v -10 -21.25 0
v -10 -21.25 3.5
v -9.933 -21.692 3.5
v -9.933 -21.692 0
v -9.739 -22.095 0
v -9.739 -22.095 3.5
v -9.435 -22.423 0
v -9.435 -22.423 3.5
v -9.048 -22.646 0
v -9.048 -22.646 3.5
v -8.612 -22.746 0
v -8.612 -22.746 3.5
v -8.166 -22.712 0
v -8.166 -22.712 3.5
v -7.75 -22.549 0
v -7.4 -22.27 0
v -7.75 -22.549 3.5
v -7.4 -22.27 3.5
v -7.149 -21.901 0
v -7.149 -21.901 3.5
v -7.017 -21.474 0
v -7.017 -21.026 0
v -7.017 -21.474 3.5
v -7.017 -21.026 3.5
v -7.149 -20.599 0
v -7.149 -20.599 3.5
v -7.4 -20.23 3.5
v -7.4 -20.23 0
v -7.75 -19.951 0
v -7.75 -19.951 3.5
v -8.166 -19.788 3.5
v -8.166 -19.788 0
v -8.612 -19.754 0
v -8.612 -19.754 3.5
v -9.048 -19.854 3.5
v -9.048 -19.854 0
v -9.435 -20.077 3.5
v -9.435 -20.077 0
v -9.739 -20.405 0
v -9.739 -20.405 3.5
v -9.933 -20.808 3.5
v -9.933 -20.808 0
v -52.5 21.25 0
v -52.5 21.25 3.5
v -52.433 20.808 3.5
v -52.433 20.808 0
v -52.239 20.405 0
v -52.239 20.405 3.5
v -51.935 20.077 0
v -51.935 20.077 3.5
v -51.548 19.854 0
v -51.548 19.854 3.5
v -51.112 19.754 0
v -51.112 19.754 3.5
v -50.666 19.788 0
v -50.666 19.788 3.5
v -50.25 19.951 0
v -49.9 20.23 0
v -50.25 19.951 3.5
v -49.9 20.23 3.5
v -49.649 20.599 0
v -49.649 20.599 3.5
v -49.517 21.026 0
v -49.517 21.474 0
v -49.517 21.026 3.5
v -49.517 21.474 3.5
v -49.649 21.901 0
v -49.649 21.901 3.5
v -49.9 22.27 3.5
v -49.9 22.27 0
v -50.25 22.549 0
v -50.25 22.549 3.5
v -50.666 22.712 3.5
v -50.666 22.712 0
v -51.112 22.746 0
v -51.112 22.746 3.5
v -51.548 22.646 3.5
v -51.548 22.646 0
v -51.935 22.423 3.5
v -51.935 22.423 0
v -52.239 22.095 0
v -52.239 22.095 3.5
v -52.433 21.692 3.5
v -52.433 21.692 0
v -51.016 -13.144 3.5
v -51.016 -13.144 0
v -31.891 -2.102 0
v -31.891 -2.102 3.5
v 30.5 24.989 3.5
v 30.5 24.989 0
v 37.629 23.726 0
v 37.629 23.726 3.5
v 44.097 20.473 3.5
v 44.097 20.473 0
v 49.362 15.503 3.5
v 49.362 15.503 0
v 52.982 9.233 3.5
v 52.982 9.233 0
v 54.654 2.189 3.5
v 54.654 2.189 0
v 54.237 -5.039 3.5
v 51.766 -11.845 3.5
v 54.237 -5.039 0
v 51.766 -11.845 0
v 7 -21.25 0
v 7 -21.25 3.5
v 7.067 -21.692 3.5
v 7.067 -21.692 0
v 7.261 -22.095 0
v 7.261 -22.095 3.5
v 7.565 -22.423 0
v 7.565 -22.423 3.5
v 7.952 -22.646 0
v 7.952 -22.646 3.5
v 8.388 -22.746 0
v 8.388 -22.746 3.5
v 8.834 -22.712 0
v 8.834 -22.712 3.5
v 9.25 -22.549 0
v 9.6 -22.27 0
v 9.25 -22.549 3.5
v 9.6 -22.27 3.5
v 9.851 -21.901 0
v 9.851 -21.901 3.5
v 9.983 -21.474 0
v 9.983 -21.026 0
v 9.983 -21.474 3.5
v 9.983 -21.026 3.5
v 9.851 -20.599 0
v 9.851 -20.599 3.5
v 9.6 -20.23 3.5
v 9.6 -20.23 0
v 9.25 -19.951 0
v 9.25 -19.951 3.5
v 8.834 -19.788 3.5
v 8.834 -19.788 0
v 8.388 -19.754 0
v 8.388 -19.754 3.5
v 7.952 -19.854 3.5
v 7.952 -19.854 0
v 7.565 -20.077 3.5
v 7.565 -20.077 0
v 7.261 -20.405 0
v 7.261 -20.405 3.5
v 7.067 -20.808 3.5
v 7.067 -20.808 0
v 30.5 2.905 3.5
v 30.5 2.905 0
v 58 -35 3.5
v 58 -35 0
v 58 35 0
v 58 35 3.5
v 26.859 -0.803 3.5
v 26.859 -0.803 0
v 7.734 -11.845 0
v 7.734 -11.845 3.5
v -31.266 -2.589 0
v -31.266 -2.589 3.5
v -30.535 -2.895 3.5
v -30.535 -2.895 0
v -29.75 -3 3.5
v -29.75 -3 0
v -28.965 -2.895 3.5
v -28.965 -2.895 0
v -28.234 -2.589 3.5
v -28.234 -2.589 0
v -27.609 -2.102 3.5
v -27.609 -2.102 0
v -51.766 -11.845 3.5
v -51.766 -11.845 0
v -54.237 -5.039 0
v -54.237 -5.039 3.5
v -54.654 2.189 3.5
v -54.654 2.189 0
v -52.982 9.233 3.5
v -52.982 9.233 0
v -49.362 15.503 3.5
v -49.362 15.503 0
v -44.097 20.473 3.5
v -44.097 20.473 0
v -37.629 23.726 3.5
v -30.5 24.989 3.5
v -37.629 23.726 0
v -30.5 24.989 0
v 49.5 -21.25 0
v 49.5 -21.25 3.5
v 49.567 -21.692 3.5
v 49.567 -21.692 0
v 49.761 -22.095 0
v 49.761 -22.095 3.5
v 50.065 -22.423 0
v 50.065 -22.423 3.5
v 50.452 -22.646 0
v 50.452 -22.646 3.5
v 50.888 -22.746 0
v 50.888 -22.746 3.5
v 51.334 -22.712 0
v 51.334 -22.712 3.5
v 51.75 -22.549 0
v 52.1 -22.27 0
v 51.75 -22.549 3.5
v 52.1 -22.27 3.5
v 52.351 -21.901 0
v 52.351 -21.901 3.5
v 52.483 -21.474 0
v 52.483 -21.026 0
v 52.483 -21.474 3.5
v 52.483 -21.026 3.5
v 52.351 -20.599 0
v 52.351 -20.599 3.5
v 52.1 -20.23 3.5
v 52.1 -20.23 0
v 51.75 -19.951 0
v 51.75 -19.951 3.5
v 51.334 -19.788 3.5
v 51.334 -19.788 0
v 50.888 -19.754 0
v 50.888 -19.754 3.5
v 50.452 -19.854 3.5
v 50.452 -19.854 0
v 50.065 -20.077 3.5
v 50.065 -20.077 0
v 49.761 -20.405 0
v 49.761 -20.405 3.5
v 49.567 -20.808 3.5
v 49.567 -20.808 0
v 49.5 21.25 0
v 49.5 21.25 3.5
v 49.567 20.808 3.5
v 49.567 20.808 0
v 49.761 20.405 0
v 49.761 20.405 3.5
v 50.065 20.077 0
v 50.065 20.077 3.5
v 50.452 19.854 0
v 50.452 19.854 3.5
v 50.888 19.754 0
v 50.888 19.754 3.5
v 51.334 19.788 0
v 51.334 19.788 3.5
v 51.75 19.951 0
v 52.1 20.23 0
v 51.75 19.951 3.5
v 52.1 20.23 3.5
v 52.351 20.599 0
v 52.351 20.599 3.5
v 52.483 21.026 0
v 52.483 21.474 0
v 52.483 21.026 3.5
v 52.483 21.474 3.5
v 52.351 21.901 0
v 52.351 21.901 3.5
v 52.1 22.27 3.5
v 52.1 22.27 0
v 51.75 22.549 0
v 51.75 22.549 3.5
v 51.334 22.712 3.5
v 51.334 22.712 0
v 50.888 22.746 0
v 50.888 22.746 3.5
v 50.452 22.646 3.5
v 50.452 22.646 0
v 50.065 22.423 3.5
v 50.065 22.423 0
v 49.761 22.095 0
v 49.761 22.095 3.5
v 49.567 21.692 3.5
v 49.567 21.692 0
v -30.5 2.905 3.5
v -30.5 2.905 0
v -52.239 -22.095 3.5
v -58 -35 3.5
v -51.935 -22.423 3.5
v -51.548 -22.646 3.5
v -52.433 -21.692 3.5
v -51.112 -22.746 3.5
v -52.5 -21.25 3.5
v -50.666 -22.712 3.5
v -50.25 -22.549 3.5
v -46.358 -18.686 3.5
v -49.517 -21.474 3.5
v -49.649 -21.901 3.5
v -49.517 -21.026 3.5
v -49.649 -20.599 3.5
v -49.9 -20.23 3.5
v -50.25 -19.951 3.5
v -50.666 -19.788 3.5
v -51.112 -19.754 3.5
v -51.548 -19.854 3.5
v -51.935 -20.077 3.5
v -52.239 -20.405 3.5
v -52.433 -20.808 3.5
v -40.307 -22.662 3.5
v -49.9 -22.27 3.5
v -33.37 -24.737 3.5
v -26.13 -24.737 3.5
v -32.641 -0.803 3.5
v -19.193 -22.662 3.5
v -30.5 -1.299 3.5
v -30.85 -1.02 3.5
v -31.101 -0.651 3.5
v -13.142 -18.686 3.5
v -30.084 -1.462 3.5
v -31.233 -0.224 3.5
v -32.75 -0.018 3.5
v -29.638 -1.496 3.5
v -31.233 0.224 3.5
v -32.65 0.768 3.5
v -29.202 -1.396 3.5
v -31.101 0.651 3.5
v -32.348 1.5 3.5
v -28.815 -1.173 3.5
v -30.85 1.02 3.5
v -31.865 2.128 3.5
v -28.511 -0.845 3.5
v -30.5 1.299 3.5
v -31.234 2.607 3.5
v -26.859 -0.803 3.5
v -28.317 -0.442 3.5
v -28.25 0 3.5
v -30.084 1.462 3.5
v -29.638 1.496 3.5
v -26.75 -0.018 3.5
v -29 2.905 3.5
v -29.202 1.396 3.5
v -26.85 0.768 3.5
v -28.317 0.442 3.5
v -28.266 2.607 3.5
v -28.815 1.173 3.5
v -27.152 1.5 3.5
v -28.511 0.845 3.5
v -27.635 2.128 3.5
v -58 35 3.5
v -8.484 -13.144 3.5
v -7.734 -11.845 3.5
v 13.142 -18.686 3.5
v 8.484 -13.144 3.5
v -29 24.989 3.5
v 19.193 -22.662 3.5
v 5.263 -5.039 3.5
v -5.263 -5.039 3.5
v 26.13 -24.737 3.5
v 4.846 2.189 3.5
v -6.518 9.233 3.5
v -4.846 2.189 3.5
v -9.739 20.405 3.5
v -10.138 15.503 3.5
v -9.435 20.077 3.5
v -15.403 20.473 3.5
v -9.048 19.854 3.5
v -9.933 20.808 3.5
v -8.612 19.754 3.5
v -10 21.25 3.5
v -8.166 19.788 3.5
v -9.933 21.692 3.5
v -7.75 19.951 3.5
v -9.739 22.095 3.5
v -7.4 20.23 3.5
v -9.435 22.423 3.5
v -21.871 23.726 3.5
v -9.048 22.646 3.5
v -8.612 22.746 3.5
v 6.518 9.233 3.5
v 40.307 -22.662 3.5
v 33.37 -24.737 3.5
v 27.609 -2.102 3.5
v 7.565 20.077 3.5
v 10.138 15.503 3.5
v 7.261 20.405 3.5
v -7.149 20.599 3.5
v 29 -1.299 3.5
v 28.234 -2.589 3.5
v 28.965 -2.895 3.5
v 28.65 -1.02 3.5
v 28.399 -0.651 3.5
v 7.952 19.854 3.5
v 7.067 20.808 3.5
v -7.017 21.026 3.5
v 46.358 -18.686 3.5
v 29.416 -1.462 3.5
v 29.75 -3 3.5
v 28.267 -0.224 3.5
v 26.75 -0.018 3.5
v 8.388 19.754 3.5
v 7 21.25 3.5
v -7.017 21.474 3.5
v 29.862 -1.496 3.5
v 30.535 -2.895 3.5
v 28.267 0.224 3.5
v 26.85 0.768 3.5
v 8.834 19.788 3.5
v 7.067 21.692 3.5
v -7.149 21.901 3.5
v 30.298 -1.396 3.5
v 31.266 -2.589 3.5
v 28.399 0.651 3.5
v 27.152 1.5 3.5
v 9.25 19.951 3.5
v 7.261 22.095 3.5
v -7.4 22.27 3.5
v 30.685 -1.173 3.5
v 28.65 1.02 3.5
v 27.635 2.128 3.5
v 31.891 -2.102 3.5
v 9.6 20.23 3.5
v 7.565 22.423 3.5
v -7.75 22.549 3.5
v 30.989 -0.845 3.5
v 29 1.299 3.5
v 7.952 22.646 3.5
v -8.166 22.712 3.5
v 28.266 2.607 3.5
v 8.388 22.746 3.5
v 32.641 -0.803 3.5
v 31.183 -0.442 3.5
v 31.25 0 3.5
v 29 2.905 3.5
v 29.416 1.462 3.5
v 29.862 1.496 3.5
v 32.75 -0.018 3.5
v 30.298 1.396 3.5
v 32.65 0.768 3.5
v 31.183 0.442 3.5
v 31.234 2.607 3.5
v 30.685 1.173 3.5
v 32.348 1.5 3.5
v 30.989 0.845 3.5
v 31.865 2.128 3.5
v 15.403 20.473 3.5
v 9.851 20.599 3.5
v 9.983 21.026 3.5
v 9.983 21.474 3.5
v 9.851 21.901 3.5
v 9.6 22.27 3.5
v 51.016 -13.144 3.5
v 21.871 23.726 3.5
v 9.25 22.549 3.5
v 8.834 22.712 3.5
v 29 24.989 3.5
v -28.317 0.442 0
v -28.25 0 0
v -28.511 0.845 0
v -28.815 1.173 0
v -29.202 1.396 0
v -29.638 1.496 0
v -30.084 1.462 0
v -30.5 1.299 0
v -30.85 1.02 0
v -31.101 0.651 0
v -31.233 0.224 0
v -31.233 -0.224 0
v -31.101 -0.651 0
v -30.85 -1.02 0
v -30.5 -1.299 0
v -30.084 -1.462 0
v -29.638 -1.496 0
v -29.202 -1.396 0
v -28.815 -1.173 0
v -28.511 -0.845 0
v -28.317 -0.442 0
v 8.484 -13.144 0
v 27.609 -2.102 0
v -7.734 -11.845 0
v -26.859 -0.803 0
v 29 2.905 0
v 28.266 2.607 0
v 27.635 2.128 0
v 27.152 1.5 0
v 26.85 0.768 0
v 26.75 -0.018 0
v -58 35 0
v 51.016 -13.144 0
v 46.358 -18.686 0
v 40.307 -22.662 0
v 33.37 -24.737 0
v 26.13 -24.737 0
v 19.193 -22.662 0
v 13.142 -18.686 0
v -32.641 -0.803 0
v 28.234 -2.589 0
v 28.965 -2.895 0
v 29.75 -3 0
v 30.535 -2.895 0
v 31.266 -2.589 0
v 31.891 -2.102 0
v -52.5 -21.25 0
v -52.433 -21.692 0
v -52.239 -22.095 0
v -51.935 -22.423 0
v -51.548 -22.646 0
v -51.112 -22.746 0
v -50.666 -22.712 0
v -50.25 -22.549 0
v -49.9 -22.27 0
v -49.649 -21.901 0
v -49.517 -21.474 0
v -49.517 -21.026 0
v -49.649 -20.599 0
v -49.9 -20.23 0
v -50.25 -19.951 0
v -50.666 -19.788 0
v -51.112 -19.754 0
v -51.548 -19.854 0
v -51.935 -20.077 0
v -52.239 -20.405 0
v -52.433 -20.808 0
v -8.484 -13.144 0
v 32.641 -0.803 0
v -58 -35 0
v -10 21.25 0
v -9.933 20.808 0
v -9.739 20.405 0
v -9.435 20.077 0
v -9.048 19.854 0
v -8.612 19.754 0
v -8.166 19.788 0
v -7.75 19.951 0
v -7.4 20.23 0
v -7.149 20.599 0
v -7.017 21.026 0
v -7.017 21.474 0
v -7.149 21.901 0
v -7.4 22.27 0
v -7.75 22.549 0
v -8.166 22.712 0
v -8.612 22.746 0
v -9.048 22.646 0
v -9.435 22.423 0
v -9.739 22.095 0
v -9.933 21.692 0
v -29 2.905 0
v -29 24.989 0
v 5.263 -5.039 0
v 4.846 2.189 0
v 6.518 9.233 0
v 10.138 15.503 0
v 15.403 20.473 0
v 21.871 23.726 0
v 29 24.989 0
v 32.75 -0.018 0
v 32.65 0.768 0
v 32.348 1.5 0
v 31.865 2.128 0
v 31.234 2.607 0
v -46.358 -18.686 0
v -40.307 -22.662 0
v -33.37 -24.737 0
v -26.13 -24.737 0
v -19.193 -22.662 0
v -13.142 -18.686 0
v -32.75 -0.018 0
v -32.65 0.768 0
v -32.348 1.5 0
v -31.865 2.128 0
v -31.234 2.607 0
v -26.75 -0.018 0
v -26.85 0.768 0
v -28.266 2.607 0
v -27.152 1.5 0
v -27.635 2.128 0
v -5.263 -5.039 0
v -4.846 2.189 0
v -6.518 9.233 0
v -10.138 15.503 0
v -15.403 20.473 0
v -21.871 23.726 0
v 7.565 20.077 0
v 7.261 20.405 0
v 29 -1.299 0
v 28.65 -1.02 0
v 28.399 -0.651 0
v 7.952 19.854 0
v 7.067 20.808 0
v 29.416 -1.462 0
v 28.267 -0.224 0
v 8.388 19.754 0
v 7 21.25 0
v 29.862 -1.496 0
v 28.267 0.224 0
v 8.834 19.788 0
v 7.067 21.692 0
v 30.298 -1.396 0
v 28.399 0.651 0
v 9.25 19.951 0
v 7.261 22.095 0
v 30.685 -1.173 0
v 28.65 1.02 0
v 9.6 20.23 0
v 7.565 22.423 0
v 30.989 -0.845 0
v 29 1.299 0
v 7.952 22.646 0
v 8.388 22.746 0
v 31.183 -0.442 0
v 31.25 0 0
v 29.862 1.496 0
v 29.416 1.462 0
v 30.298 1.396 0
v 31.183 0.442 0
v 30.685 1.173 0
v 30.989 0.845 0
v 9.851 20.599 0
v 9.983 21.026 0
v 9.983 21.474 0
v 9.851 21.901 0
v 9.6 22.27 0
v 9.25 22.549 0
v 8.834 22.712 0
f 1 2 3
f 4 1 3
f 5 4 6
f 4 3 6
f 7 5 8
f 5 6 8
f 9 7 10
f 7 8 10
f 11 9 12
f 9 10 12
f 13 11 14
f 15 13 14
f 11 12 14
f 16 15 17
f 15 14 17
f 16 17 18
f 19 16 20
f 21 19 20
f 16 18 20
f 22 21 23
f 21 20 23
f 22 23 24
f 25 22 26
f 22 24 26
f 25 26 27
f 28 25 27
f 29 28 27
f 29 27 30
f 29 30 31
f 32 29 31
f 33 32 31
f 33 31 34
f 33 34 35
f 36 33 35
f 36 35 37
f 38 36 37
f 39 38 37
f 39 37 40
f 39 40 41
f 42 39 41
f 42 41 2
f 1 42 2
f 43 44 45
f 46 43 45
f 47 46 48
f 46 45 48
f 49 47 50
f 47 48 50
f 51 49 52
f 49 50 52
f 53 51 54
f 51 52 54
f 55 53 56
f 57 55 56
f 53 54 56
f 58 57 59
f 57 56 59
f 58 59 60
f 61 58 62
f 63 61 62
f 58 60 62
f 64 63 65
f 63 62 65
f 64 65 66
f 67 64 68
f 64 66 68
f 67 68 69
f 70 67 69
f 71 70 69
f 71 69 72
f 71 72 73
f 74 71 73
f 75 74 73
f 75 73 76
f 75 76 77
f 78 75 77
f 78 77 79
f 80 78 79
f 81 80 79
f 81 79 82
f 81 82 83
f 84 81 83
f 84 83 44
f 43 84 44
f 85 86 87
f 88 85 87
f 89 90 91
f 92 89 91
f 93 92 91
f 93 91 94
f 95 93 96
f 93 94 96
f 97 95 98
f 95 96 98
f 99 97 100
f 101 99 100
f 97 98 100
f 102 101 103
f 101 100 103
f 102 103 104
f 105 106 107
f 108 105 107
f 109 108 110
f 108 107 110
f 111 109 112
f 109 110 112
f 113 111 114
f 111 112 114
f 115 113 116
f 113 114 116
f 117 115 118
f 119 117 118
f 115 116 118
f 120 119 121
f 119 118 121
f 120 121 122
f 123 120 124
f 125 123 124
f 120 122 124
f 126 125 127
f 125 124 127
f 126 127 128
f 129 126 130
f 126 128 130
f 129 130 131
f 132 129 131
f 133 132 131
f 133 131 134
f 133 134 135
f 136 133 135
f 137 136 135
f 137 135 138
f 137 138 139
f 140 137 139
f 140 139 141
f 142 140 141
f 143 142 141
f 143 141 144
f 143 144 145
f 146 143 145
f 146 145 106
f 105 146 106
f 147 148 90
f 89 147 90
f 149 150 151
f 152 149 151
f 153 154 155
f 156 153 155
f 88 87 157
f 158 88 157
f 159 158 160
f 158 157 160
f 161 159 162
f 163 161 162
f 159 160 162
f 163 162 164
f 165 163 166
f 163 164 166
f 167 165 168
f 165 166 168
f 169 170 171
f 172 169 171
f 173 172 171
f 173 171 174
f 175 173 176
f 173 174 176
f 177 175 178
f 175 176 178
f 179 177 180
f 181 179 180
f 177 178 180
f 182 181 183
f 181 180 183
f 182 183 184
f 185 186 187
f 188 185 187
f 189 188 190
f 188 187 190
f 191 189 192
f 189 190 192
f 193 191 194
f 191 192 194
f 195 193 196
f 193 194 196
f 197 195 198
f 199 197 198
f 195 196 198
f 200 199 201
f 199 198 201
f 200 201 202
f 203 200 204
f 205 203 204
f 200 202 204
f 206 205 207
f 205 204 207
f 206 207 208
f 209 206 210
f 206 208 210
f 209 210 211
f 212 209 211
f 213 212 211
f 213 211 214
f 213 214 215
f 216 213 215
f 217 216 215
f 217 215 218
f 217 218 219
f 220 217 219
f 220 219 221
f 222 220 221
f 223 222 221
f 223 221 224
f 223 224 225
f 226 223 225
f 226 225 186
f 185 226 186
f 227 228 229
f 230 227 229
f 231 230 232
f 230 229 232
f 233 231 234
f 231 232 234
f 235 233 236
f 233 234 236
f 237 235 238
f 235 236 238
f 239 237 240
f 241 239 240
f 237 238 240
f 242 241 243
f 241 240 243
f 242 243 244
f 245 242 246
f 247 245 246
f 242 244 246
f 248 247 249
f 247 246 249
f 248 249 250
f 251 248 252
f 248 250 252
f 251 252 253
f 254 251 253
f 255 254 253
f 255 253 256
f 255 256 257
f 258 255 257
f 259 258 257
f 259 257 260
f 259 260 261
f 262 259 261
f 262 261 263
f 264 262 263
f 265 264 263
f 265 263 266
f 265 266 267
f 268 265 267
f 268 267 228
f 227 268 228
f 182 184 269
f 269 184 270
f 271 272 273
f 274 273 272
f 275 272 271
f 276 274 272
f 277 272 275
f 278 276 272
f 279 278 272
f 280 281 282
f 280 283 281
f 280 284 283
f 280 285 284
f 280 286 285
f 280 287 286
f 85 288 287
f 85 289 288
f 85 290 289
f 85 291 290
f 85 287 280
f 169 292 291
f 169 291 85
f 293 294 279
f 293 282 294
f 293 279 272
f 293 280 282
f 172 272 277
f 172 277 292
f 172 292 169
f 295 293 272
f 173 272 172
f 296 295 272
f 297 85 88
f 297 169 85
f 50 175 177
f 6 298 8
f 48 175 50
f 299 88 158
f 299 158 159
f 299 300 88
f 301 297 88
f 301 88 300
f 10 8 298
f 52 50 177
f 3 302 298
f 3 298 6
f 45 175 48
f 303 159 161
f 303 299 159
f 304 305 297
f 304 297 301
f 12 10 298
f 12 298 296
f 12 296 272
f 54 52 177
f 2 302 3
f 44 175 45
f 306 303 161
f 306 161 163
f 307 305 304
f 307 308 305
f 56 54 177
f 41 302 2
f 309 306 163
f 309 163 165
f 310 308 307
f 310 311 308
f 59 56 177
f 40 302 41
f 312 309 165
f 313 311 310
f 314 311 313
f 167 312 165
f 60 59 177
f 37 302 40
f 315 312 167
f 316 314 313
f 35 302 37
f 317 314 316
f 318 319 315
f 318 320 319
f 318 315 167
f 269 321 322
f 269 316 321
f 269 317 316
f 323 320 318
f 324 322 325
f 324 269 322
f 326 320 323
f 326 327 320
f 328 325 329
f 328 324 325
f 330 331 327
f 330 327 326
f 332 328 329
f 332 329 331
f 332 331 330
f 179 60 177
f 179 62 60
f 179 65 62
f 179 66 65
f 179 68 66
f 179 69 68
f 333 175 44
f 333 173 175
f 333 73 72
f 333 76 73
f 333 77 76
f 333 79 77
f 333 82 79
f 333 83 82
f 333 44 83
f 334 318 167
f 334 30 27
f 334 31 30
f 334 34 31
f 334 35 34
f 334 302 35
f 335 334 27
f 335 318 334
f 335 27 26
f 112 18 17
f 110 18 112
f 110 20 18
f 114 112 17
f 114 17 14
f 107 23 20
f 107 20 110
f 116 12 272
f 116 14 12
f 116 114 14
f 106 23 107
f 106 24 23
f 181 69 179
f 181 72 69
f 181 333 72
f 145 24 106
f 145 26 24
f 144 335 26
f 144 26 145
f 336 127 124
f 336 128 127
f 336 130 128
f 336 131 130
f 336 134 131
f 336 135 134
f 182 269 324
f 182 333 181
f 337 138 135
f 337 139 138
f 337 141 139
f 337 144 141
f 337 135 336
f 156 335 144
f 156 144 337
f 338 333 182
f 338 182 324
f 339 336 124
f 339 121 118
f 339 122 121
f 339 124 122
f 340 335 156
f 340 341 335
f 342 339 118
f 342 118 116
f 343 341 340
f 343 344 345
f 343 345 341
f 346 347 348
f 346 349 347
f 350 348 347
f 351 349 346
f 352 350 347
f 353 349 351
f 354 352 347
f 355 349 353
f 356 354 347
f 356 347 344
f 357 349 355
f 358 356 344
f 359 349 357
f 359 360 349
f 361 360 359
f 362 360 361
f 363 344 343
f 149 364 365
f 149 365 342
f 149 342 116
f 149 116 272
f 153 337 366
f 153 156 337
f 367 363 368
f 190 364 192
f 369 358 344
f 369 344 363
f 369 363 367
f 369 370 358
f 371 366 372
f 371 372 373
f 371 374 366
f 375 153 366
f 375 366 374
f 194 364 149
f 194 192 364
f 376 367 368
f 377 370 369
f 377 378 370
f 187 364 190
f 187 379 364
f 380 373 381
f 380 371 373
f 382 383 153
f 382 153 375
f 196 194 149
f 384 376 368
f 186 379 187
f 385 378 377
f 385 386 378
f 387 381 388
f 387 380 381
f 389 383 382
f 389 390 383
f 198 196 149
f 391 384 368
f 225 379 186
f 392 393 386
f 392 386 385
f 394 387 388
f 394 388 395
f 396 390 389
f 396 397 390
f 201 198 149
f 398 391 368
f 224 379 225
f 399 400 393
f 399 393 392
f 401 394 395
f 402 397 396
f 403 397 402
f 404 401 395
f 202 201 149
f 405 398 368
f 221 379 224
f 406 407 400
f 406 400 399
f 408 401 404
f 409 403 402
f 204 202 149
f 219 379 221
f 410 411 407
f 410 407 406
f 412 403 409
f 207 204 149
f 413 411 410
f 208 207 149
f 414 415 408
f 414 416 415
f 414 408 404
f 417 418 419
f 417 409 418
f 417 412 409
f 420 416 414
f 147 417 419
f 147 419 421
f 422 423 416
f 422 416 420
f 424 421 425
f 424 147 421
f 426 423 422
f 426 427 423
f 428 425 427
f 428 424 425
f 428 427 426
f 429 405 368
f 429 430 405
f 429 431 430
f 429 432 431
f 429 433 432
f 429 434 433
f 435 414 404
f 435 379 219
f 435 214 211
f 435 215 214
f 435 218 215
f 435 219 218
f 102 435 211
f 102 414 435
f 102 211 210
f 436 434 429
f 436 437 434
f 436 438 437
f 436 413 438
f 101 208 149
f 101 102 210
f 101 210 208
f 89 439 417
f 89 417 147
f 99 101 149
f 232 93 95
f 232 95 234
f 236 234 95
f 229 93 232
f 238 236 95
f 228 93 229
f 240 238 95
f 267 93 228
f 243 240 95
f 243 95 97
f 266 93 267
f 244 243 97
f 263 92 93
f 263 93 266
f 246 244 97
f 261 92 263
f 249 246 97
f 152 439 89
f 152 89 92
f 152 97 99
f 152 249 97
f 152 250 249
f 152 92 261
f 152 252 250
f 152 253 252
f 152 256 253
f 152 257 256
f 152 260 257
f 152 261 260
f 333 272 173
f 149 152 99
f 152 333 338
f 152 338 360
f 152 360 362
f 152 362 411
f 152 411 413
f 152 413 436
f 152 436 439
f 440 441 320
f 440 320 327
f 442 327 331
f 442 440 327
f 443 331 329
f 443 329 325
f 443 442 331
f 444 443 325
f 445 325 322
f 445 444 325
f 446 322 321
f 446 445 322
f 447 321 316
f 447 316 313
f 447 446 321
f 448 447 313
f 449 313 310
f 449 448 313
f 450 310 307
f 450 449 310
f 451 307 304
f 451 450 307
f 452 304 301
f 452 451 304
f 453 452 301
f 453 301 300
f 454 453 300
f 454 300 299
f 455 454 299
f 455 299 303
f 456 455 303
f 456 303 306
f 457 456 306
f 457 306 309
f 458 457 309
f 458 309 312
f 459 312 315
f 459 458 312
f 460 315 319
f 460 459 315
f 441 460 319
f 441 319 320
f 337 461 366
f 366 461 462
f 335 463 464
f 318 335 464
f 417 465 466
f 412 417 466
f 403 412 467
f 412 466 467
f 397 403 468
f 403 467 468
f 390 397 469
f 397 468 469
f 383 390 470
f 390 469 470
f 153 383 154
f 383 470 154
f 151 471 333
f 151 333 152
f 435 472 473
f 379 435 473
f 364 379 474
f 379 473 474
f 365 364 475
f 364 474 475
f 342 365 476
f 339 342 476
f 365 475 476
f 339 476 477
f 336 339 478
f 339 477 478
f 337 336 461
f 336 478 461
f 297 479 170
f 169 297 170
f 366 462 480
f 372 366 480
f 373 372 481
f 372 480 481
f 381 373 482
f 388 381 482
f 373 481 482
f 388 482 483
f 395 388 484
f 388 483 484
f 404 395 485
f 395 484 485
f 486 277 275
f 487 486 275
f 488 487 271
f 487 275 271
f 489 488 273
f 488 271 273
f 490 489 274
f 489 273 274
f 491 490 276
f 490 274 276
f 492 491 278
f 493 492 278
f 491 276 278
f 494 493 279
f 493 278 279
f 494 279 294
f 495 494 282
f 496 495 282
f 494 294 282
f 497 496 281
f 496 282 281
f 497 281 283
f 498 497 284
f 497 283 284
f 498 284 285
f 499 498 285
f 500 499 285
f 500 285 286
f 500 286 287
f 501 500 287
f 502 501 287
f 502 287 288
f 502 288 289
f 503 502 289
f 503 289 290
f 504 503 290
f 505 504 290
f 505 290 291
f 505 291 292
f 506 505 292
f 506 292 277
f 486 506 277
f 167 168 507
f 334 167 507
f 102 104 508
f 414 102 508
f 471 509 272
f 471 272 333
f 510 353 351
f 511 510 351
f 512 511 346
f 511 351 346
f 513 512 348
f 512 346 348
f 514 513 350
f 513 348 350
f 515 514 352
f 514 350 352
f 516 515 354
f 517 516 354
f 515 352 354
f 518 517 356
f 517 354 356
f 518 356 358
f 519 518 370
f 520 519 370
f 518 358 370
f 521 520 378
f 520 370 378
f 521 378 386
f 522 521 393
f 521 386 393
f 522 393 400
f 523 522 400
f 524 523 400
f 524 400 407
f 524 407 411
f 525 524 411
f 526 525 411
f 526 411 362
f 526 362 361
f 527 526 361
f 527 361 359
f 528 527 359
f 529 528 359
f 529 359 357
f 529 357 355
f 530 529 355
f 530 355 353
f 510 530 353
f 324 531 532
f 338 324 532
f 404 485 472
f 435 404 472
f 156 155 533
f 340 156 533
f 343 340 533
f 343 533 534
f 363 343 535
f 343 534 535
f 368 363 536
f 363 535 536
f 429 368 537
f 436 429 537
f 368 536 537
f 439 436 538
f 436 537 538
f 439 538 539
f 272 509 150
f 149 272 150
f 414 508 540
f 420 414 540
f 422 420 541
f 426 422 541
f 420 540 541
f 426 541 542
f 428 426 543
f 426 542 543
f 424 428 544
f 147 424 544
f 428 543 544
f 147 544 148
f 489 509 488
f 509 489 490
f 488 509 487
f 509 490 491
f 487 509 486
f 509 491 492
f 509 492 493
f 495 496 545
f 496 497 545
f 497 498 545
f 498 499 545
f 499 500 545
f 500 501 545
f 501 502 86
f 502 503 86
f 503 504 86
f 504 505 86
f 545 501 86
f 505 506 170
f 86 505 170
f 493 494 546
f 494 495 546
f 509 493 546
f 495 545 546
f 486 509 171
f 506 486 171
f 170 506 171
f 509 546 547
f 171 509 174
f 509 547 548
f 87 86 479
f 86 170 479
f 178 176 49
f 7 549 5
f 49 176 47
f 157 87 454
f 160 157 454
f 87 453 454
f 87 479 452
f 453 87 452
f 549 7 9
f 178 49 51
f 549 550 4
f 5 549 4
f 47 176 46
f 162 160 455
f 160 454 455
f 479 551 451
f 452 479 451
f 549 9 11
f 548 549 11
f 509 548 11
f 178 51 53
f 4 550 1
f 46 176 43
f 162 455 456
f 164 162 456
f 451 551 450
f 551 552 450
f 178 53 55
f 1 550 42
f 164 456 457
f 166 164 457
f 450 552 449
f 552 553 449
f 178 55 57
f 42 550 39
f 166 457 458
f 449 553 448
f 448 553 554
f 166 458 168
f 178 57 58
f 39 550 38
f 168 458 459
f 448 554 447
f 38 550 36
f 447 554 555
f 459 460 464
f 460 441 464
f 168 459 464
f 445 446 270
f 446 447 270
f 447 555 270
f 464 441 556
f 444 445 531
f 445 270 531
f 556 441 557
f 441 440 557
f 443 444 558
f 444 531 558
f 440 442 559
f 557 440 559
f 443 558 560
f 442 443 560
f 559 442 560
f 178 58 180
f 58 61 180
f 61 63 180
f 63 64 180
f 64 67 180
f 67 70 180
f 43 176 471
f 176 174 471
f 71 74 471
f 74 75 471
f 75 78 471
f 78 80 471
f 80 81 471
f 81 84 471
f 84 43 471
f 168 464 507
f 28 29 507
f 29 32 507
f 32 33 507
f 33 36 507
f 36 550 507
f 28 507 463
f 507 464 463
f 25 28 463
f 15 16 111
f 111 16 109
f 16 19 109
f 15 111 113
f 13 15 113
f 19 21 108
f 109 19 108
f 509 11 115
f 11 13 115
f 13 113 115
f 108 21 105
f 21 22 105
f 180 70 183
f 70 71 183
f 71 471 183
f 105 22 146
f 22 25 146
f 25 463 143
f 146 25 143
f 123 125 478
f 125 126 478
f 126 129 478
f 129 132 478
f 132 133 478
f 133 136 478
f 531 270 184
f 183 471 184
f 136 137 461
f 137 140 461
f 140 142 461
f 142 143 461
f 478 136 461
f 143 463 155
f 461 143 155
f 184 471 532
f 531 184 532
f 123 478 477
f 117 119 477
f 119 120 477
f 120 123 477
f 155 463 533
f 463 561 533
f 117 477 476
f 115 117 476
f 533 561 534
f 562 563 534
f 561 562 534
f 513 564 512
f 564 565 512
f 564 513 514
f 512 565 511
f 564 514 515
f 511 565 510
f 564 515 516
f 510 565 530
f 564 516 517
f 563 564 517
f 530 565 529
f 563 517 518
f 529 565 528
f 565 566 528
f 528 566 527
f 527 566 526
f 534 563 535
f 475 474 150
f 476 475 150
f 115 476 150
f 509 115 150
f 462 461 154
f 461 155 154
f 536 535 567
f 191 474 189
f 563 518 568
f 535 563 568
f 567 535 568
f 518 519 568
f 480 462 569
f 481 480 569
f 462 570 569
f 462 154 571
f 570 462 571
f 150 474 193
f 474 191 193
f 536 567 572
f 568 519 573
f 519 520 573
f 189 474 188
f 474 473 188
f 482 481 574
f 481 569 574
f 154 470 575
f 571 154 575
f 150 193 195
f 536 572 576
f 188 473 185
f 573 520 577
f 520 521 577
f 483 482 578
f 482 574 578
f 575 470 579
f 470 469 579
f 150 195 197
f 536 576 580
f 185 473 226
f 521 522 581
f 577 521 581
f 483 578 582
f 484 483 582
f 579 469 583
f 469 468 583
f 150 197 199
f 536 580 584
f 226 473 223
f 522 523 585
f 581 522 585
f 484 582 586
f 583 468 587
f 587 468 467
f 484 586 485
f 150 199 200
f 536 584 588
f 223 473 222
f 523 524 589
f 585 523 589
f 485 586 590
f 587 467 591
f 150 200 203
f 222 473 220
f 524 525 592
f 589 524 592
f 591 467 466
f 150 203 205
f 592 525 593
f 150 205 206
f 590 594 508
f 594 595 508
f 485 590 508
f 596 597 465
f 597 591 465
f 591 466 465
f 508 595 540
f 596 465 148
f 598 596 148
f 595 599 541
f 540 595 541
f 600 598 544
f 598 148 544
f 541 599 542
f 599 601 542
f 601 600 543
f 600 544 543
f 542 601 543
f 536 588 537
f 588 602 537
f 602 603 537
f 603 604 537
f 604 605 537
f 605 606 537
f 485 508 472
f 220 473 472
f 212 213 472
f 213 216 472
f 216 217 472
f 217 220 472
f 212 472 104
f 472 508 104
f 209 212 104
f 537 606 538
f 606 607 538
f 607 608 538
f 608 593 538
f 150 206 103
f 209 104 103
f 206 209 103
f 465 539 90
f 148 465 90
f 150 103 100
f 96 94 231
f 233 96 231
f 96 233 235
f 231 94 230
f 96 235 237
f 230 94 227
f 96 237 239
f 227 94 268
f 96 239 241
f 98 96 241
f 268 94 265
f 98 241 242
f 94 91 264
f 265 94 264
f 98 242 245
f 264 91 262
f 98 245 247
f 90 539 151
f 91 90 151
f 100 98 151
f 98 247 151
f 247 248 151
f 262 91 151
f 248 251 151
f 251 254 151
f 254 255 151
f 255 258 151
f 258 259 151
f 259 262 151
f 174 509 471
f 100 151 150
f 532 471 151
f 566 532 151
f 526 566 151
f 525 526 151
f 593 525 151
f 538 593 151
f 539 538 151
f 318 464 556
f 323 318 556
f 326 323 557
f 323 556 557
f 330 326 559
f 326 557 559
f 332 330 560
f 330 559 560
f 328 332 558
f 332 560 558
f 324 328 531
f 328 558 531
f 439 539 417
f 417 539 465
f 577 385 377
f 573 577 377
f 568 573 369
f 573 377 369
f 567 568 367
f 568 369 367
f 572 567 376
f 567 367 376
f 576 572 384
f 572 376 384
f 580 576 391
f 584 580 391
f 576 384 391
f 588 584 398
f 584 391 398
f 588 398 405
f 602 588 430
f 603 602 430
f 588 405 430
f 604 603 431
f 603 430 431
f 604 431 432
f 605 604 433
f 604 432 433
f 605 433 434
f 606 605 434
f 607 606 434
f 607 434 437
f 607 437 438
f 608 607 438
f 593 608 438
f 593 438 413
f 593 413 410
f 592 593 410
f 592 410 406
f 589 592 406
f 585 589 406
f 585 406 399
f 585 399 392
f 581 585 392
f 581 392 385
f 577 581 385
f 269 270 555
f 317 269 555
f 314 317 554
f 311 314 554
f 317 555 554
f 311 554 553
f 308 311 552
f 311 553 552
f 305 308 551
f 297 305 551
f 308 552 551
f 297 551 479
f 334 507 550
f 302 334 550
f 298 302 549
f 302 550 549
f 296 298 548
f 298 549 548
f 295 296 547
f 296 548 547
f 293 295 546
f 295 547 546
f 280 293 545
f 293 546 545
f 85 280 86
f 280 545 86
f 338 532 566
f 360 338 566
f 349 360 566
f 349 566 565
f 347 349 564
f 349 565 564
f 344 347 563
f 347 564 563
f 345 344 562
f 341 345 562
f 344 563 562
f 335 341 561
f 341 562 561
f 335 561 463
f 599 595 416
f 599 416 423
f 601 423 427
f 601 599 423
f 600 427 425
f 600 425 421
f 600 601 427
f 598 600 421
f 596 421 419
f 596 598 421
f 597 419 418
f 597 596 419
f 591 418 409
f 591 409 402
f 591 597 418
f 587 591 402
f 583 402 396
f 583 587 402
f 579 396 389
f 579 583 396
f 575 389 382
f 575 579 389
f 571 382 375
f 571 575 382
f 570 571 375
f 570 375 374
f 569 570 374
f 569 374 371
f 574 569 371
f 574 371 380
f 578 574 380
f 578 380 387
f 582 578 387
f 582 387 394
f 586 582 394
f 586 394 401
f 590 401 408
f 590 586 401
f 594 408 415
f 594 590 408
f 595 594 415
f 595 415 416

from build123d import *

# Parameters (mm, degrees)
F0_W     = 116
F0_H     = 70
F0_R     = 1.5
F1_DEPTH = 3.5
F2_D     = 3


# Not quite as in the source:
# - a feature names something its author has since deleted; it is built from what else it names


with BuildPart() as f1:
    # F0 (on Top) → F1 (new body)
    with BuildSketch(Plane.XY):
        Rectangle(F0_W, F0_H)
        with BuildLine():
            ThreePointArc((-8.4841098843, -13.1438927866), (-29.75, -25), (-51.0158901157, -13.1438927866))
            Line((-51.0158901157, -13.1438927866), (-31.8905764747, -2.1018878077))
            ThreePointArc((-31.8905764747, -2.1018878077), (-29.75, -3), (-27.6094235253, -2.1018878077))
            Line((-27.6094235253, -2.1018878077), (-8.4841098843, -13.1438927866))
        make_face(mode=Mode.SUBTRACT)
        with BuildLine():
            Line((31.8905764747, -2.1018878077), (51.0158901157, -13.1438927866))
            ThreePointArc((51.0158901157, -13.1438927866), (29.75, -25), (8.4841098843, -13.1438927866))
            Line((8.4841098843, -13.1438927866), (27.6094235253, -2.1018878077))
            ThreePointArc((27.6094235253, -2.1018878077), (29.75, -3), (31.8905764747, -2.1018878077))
        make_face(mode=Mode.SUBTRACT)
        with Locations((-29.75, 0)):
            Circle(F0_R, mode=Mode.SUBTRACT)
        with BuildLine():
            ThreePointArc((-51.7658901157, -11.844854681), (-51.4006350946, 12.5), (-30.5, 24.9887474676))
            Line((-30.5, 24.9887474676), (-30.5, 2.9047375097))
            ThreePointArc((-30.5, 2.9047375097), (-32.3480762114, 1.5), (-32.6405764747, -0.802849702))
            Line((-32.6405764747, -0.802849702), (-51.7658901157, -11.844854681))
        make_face(mode=Mode.SUBTRACT)
        with BuildLine():
            Line((-29, 2.9047375097), (-29, 24.9887474676))
            ThreePointArc((-29, 24.9887474676), (-8.0993649054, 12.5), (-7.7341098843, -11.844854681))
            Line((-7.7341098843, -11.844854681), (-26.8594235253, -0.802849702))
            ThreePointArc((-26.8594235253, -0.802849702), (-27.1519237886, 1.5), (-29, 2.9047375097))
        make_face(mode=Mode.SUBTRACT)
        with BuildLine():
            ThreePointArc((7.7341098843, -11.844854681), (8.0993649054, 12.5), (29, 24.9887474676))
            Line((29, 24.9887474676), (29, 2.9047375097))
            ThreePointArc((29, 2.9047375097), (27.1519237886, 1.5), (26.8594235253, -0.802849702))
            Line((26.8594235253, -0.802849702), (7.7341098843, -11.844854681))
        make_face(mode=Mode.SUBTRACT)
        with Locations((29.75, 0)):
            Circle(F0_R, mode=Mode.SUBTRACT)
        with BuildLine():
            Line((30.5, 2.9047375097), (30.5, 24.9887474676))
            ThreePointArc((30.5, 24.9887474676), (51.4006350946, 12.5), (51.7658901157, -11.844854681))
            Line((51.7658901157, -11.844854681), (32.6405764747, -0.802849702))
            ThreePointArc((32.6405764747, -0.802849702), (32.3480762114, 1.5), (30.5, 2.9047375097))
        make_face(mode=Mode.SUBTRACT)
    extrude(amount=F1_DEPTH)

    # F2 (through all)
    with Locations(Plane(origin=(0, 0, 0), x_dir=(1, 0, 0), z_dir=(0, 0, -1))):
        with Locations((-51, -21.25), (-51, 21.25), (-8.5, 21.25), (-8.5, -21.25), (8.5, -21.25), (8.5, 21.25), (51, 21.25), (51, -21.25)):
            Hole(F2_D / 2)


solid = f1.part
